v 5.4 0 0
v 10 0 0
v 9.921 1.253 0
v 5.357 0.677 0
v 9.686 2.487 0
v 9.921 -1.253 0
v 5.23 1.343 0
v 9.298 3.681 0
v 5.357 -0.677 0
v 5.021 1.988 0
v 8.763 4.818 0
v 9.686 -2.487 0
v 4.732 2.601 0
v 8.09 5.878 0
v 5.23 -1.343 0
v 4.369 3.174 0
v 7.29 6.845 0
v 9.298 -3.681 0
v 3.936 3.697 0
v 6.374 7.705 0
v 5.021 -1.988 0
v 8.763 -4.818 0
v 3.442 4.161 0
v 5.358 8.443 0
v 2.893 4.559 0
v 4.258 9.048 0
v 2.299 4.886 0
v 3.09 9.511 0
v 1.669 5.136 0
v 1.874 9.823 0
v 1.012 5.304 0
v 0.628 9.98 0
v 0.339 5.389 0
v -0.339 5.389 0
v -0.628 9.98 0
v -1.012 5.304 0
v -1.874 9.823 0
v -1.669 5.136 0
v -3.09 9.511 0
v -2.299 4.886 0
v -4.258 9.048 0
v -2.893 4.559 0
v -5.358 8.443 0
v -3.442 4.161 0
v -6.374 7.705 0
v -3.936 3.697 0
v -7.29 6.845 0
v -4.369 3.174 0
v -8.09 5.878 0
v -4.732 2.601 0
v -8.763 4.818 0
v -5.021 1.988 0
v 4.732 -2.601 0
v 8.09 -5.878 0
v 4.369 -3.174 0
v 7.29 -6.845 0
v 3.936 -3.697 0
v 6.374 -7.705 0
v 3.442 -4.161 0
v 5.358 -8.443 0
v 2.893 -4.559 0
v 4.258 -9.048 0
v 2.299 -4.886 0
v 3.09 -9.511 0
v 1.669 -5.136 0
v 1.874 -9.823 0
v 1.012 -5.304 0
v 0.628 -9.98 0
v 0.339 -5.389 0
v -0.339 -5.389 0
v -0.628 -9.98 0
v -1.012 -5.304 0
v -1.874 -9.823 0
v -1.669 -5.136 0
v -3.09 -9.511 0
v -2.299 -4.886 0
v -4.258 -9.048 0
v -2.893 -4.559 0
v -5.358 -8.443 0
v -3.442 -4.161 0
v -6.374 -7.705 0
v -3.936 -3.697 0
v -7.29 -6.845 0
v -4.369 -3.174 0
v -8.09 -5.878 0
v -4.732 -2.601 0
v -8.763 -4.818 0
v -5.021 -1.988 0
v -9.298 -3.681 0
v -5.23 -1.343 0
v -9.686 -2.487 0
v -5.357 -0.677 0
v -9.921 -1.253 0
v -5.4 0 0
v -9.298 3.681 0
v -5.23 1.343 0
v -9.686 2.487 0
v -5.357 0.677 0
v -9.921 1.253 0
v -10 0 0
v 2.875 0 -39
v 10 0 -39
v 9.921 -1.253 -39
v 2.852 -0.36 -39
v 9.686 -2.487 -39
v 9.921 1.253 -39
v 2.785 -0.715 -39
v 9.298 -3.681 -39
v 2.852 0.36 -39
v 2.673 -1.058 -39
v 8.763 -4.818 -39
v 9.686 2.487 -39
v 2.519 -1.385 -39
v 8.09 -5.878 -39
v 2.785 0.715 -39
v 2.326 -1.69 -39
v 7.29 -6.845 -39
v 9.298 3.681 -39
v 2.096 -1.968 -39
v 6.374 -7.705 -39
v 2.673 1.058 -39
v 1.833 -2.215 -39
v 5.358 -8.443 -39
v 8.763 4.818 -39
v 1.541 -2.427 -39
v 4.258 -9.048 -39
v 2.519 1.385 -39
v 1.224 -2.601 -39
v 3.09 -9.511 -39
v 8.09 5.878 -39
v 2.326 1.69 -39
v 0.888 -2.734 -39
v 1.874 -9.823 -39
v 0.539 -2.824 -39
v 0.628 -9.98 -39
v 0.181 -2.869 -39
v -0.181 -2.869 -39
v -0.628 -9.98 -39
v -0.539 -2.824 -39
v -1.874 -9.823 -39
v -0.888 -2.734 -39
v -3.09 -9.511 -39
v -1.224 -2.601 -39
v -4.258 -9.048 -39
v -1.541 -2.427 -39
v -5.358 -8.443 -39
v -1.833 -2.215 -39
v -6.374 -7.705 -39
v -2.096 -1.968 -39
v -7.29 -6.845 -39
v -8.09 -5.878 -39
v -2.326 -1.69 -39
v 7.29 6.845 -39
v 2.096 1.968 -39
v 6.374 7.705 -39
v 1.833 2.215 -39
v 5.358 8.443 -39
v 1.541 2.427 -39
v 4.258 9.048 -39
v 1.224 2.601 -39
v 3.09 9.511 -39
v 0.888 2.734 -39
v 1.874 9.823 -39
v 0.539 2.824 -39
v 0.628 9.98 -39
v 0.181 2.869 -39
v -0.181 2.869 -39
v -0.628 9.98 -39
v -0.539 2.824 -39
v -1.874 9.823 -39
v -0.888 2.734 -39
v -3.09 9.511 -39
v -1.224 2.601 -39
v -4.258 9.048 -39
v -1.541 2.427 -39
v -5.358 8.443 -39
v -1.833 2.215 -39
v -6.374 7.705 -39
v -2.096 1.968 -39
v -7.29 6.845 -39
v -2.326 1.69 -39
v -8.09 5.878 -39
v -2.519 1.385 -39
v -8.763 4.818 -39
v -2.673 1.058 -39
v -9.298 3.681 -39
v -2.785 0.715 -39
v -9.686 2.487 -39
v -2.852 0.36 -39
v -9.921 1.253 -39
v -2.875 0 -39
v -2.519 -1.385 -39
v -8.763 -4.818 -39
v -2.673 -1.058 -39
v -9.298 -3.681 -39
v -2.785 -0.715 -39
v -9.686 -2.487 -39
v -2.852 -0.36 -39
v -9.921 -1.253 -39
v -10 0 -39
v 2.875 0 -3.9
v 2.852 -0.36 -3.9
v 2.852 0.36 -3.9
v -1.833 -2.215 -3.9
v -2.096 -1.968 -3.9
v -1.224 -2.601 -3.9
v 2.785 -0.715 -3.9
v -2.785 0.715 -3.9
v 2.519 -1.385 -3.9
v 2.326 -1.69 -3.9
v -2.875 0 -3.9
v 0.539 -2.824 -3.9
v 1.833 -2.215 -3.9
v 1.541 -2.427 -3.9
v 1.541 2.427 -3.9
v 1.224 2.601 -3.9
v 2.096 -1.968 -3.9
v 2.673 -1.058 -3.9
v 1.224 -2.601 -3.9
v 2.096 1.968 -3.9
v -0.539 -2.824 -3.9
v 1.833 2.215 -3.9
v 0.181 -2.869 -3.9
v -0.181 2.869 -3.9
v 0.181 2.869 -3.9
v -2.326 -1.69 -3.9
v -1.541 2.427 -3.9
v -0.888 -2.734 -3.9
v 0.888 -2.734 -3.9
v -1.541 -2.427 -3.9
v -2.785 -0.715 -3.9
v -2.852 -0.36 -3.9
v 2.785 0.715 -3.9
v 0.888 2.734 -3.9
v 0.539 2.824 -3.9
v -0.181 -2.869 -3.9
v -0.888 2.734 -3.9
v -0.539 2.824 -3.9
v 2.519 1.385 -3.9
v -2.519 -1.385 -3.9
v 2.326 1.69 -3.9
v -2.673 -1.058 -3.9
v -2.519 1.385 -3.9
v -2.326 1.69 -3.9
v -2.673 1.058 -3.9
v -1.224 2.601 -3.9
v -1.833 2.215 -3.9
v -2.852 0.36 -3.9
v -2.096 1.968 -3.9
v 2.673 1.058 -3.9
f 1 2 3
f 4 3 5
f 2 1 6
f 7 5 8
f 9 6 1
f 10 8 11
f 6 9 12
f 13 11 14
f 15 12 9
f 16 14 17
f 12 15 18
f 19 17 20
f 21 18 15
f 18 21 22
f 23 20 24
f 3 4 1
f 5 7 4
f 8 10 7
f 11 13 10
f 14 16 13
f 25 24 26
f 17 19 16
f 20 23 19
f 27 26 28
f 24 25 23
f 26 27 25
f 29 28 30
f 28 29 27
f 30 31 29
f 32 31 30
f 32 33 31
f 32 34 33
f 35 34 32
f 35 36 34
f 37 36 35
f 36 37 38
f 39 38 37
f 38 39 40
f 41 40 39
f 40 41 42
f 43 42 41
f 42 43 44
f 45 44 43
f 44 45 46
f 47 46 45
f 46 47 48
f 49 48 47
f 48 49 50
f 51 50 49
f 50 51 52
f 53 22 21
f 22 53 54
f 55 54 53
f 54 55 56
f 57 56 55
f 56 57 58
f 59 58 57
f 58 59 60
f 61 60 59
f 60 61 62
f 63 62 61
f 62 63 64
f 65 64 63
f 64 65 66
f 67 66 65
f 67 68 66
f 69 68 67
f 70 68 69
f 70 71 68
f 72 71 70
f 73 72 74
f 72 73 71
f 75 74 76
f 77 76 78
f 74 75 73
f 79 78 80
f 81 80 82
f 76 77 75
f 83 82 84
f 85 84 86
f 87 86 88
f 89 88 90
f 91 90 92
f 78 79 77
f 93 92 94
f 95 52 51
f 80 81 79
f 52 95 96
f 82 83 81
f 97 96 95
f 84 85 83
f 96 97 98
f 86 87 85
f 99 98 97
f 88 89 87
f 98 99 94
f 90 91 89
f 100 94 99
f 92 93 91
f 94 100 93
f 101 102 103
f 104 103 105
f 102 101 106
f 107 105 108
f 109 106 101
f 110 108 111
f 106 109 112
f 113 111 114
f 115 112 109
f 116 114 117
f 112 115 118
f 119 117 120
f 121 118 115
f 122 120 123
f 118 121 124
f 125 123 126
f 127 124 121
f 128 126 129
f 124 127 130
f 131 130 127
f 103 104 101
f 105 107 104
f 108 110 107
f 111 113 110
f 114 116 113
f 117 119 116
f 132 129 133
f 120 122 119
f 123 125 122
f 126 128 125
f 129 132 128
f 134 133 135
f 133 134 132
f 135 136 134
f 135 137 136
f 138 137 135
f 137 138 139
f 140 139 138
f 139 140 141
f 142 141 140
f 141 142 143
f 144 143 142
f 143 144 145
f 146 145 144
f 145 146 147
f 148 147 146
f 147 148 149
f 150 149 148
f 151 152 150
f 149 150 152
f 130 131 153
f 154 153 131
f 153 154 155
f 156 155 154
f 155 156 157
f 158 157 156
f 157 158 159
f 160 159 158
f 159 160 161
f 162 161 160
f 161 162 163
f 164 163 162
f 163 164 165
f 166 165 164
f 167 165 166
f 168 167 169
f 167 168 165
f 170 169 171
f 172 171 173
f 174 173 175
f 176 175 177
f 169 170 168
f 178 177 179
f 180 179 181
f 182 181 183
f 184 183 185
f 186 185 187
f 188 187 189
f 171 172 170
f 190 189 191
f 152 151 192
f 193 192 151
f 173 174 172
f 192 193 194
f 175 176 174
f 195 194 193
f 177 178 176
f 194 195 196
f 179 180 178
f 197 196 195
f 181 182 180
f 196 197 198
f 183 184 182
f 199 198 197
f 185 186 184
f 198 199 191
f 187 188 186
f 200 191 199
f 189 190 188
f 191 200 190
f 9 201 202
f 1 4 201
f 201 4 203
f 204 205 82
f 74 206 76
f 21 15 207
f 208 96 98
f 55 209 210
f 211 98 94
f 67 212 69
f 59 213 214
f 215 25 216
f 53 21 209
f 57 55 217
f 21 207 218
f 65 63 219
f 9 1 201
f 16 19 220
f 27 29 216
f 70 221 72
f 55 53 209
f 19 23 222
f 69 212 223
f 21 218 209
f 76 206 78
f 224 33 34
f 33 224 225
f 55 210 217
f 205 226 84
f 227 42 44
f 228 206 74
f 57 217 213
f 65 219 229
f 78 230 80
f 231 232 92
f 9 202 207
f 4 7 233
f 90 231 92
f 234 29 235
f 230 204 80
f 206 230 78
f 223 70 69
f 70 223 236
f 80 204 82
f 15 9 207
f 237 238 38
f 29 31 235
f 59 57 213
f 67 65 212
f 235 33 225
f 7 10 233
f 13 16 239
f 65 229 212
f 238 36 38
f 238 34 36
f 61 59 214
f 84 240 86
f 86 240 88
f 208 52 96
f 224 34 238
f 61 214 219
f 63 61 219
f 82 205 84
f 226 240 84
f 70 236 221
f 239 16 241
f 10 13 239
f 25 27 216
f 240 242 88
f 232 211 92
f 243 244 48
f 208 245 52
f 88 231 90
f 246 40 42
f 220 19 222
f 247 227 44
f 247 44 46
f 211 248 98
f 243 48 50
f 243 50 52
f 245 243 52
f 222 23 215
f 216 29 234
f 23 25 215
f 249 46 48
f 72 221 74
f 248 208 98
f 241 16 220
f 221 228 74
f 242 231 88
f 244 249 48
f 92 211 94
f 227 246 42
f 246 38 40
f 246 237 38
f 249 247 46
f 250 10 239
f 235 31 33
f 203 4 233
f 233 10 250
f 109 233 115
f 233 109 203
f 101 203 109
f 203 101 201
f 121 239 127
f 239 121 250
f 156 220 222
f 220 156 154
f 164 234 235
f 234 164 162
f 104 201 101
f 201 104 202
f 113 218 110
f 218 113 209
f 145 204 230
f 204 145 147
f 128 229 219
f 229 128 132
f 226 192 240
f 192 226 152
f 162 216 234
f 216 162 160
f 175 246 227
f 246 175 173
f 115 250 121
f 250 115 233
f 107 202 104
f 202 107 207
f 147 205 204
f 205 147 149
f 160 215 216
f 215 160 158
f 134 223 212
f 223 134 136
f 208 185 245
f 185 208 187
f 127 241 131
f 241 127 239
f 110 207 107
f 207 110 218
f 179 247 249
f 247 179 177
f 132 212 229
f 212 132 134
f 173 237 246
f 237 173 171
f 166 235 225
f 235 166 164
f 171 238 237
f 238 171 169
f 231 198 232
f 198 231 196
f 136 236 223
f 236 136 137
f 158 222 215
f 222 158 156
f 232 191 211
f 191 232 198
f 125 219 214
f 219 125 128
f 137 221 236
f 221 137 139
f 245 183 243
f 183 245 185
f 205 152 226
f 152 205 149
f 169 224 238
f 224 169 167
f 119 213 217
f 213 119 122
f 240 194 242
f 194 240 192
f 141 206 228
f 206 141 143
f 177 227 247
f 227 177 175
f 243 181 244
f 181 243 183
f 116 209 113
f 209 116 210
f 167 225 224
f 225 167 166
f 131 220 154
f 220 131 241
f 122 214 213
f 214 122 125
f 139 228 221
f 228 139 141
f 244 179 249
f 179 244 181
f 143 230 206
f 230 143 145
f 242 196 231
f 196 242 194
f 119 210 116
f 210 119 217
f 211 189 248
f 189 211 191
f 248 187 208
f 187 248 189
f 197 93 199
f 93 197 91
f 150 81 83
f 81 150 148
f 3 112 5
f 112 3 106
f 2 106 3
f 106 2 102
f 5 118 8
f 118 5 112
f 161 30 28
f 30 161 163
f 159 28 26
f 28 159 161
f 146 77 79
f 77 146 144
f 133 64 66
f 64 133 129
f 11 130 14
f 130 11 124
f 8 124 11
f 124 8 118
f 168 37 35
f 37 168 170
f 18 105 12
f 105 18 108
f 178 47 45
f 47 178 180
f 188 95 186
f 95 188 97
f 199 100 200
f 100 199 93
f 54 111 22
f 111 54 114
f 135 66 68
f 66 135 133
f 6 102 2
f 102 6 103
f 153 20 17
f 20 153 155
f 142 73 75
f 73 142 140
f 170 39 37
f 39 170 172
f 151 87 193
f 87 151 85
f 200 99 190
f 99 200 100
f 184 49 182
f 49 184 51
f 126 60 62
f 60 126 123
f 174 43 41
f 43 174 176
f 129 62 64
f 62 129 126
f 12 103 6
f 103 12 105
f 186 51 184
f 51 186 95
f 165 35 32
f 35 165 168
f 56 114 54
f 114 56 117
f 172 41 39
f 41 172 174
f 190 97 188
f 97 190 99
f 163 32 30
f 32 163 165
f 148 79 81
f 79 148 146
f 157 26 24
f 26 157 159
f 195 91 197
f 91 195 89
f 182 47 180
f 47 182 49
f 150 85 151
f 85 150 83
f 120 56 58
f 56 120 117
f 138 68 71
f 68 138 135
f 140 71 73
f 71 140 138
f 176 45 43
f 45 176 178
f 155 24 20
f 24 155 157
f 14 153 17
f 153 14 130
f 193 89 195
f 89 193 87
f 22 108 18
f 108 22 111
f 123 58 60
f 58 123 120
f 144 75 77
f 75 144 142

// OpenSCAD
$fn = 50;


difference() {
	union() {
		translate(v = [0, 0, -39.0000000000]) {
			cylinder(h = 39, r = 10.0000000000);
		}
		cylinder(h = 0, r = 19.0000000000);
	}
	union() {
		translate(v = [0, 0, 0]) {
			rotate(a = [0, 0, 0]) {
				difference() {
					union() {
						#translate(v = [0, 0, -39.0000000000]) {
							cylinder(h = 39, r = 2.6000000000);
						}
						#translate(v = [0, 0, -3.9000000000]) {
							cylinder(h = 3.9000000000, r1 = 2.8750000000, r2 = 5.4000000000);
						}
						#translate(v = [0, 0, -39.0000000000]) {
							cylinder(h = 39, r = 2.8750000000);
						}
						#translate(v = [0, 0, -39.0000000000]) {
							cylinder(h = 39, r = 2.6000000000);
						}
					}
					union();
				}
			}
		}
	}
}
